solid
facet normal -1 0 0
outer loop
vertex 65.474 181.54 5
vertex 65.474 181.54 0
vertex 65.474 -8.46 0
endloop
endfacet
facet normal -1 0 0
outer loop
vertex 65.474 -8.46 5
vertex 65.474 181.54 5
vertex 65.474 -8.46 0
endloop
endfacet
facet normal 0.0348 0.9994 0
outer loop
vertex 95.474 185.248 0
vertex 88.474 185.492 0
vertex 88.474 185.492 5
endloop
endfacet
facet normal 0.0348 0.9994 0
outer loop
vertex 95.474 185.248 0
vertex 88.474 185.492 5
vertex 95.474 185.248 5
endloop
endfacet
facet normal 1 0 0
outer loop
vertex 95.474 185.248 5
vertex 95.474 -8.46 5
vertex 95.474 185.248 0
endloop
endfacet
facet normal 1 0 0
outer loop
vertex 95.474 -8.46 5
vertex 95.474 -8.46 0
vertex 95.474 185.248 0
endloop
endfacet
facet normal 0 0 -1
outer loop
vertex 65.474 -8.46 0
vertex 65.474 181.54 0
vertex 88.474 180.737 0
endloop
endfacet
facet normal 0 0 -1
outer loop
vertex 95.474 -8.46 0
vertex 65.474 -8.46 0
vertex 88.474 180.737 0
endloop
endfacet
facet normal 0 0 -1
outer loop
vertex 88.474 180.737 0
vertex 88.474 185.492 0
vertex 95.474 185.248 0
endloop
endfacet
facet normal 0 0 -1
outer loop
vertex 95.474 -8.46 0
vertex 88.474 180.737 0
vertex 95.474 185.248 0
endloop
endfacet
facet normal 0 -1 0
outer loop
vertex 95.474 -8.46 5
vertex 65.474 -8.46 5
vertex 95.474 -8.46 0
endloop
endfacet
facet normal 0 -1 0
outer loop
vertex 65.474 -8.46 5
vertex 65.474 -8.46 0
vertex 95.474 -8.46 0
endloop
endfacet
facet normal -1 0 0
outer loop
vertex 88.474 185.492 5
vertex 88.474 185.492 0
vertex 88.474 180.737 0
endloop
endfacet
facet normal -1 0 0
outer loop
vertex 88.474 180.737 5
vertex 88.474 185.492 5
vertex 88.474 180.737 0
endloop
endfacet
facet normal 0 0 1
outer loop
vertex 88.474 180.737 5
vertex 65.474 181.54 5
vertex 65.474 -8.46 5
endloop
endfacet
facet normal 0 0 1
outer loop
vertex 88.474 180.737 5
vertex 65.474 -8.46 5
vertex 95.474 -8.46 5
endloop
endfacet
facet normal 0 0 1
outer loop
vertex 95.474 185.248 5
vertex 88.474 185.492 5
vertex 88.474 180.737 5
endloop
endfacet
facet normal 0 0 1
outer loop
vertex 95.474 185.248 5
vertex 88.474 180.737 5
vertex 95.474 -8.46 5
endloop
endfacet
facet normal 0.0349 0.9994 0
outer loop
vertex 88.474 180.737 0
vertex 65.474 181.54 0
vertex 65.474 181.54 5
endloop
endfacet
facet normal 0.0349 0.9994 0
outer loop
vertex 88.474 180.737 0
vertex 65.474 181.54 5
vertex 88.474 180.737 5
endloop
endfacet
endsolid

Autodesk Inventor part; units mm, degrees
ref_plane "YZ Plane" through (0, 0, 0) normal (1, 0, 0) x (0, 1, 0)
ref_plane "XZ Plane" through (0, 0, 0) normal (0, 1, 0) x (-1, 0, 0)
ref_plane "XY Plane" through (0, 0, 0) normal (0, 0, 1) x (1, 0, 0)
sketch "Sketch1" plane through (0, 0, 0) normal (0, 0, 1) x (1, 0, 0)
  line L0 (65.4735, 181.5397) -> (65.4735, -8.4603)
  line L1 (65.4735, -8.4603) -> (95.4735, -8.4603)
  line L2 (95.4735, -8.4603) -> (95.4735, 180.4921)
  line L3 (65.4735, 181.5397) -> (95.4735, 180.4921)
  line L4 (65.4735, 181.5397) -> (99.7821, 181.5397) construction
  line L5 (95.4735, 180.4921) -> (95.4735, 185.4921)
  line L6 (95.4735, 185.4921) -> (88.4735, 185.4921)
  line L7 (88.4735, 185.4921) -> (88.4735, 180.7366)
  line L8 (88.4735, 185.4921) -> (98.5031, 185.1419)
  line L9 (88.4735, 185.4921) -> (98.5092, 185.4921) construction
  point P0 (0, 0)
  point P1 (95.4735, 185.2477)
  dimension "d0" = 190
  dimension "d1" = 30
  dimension "d2" = 2
  dimension "d4" = 7
  dimension "d6" = 2
  dimension "d12" = 5
extrude "Extrusion1" add sketch "Sketch1" along normal blind 5 contours L3 L2 L1 L0 | L7 L8 L5 L3
properties part number "protostand"
